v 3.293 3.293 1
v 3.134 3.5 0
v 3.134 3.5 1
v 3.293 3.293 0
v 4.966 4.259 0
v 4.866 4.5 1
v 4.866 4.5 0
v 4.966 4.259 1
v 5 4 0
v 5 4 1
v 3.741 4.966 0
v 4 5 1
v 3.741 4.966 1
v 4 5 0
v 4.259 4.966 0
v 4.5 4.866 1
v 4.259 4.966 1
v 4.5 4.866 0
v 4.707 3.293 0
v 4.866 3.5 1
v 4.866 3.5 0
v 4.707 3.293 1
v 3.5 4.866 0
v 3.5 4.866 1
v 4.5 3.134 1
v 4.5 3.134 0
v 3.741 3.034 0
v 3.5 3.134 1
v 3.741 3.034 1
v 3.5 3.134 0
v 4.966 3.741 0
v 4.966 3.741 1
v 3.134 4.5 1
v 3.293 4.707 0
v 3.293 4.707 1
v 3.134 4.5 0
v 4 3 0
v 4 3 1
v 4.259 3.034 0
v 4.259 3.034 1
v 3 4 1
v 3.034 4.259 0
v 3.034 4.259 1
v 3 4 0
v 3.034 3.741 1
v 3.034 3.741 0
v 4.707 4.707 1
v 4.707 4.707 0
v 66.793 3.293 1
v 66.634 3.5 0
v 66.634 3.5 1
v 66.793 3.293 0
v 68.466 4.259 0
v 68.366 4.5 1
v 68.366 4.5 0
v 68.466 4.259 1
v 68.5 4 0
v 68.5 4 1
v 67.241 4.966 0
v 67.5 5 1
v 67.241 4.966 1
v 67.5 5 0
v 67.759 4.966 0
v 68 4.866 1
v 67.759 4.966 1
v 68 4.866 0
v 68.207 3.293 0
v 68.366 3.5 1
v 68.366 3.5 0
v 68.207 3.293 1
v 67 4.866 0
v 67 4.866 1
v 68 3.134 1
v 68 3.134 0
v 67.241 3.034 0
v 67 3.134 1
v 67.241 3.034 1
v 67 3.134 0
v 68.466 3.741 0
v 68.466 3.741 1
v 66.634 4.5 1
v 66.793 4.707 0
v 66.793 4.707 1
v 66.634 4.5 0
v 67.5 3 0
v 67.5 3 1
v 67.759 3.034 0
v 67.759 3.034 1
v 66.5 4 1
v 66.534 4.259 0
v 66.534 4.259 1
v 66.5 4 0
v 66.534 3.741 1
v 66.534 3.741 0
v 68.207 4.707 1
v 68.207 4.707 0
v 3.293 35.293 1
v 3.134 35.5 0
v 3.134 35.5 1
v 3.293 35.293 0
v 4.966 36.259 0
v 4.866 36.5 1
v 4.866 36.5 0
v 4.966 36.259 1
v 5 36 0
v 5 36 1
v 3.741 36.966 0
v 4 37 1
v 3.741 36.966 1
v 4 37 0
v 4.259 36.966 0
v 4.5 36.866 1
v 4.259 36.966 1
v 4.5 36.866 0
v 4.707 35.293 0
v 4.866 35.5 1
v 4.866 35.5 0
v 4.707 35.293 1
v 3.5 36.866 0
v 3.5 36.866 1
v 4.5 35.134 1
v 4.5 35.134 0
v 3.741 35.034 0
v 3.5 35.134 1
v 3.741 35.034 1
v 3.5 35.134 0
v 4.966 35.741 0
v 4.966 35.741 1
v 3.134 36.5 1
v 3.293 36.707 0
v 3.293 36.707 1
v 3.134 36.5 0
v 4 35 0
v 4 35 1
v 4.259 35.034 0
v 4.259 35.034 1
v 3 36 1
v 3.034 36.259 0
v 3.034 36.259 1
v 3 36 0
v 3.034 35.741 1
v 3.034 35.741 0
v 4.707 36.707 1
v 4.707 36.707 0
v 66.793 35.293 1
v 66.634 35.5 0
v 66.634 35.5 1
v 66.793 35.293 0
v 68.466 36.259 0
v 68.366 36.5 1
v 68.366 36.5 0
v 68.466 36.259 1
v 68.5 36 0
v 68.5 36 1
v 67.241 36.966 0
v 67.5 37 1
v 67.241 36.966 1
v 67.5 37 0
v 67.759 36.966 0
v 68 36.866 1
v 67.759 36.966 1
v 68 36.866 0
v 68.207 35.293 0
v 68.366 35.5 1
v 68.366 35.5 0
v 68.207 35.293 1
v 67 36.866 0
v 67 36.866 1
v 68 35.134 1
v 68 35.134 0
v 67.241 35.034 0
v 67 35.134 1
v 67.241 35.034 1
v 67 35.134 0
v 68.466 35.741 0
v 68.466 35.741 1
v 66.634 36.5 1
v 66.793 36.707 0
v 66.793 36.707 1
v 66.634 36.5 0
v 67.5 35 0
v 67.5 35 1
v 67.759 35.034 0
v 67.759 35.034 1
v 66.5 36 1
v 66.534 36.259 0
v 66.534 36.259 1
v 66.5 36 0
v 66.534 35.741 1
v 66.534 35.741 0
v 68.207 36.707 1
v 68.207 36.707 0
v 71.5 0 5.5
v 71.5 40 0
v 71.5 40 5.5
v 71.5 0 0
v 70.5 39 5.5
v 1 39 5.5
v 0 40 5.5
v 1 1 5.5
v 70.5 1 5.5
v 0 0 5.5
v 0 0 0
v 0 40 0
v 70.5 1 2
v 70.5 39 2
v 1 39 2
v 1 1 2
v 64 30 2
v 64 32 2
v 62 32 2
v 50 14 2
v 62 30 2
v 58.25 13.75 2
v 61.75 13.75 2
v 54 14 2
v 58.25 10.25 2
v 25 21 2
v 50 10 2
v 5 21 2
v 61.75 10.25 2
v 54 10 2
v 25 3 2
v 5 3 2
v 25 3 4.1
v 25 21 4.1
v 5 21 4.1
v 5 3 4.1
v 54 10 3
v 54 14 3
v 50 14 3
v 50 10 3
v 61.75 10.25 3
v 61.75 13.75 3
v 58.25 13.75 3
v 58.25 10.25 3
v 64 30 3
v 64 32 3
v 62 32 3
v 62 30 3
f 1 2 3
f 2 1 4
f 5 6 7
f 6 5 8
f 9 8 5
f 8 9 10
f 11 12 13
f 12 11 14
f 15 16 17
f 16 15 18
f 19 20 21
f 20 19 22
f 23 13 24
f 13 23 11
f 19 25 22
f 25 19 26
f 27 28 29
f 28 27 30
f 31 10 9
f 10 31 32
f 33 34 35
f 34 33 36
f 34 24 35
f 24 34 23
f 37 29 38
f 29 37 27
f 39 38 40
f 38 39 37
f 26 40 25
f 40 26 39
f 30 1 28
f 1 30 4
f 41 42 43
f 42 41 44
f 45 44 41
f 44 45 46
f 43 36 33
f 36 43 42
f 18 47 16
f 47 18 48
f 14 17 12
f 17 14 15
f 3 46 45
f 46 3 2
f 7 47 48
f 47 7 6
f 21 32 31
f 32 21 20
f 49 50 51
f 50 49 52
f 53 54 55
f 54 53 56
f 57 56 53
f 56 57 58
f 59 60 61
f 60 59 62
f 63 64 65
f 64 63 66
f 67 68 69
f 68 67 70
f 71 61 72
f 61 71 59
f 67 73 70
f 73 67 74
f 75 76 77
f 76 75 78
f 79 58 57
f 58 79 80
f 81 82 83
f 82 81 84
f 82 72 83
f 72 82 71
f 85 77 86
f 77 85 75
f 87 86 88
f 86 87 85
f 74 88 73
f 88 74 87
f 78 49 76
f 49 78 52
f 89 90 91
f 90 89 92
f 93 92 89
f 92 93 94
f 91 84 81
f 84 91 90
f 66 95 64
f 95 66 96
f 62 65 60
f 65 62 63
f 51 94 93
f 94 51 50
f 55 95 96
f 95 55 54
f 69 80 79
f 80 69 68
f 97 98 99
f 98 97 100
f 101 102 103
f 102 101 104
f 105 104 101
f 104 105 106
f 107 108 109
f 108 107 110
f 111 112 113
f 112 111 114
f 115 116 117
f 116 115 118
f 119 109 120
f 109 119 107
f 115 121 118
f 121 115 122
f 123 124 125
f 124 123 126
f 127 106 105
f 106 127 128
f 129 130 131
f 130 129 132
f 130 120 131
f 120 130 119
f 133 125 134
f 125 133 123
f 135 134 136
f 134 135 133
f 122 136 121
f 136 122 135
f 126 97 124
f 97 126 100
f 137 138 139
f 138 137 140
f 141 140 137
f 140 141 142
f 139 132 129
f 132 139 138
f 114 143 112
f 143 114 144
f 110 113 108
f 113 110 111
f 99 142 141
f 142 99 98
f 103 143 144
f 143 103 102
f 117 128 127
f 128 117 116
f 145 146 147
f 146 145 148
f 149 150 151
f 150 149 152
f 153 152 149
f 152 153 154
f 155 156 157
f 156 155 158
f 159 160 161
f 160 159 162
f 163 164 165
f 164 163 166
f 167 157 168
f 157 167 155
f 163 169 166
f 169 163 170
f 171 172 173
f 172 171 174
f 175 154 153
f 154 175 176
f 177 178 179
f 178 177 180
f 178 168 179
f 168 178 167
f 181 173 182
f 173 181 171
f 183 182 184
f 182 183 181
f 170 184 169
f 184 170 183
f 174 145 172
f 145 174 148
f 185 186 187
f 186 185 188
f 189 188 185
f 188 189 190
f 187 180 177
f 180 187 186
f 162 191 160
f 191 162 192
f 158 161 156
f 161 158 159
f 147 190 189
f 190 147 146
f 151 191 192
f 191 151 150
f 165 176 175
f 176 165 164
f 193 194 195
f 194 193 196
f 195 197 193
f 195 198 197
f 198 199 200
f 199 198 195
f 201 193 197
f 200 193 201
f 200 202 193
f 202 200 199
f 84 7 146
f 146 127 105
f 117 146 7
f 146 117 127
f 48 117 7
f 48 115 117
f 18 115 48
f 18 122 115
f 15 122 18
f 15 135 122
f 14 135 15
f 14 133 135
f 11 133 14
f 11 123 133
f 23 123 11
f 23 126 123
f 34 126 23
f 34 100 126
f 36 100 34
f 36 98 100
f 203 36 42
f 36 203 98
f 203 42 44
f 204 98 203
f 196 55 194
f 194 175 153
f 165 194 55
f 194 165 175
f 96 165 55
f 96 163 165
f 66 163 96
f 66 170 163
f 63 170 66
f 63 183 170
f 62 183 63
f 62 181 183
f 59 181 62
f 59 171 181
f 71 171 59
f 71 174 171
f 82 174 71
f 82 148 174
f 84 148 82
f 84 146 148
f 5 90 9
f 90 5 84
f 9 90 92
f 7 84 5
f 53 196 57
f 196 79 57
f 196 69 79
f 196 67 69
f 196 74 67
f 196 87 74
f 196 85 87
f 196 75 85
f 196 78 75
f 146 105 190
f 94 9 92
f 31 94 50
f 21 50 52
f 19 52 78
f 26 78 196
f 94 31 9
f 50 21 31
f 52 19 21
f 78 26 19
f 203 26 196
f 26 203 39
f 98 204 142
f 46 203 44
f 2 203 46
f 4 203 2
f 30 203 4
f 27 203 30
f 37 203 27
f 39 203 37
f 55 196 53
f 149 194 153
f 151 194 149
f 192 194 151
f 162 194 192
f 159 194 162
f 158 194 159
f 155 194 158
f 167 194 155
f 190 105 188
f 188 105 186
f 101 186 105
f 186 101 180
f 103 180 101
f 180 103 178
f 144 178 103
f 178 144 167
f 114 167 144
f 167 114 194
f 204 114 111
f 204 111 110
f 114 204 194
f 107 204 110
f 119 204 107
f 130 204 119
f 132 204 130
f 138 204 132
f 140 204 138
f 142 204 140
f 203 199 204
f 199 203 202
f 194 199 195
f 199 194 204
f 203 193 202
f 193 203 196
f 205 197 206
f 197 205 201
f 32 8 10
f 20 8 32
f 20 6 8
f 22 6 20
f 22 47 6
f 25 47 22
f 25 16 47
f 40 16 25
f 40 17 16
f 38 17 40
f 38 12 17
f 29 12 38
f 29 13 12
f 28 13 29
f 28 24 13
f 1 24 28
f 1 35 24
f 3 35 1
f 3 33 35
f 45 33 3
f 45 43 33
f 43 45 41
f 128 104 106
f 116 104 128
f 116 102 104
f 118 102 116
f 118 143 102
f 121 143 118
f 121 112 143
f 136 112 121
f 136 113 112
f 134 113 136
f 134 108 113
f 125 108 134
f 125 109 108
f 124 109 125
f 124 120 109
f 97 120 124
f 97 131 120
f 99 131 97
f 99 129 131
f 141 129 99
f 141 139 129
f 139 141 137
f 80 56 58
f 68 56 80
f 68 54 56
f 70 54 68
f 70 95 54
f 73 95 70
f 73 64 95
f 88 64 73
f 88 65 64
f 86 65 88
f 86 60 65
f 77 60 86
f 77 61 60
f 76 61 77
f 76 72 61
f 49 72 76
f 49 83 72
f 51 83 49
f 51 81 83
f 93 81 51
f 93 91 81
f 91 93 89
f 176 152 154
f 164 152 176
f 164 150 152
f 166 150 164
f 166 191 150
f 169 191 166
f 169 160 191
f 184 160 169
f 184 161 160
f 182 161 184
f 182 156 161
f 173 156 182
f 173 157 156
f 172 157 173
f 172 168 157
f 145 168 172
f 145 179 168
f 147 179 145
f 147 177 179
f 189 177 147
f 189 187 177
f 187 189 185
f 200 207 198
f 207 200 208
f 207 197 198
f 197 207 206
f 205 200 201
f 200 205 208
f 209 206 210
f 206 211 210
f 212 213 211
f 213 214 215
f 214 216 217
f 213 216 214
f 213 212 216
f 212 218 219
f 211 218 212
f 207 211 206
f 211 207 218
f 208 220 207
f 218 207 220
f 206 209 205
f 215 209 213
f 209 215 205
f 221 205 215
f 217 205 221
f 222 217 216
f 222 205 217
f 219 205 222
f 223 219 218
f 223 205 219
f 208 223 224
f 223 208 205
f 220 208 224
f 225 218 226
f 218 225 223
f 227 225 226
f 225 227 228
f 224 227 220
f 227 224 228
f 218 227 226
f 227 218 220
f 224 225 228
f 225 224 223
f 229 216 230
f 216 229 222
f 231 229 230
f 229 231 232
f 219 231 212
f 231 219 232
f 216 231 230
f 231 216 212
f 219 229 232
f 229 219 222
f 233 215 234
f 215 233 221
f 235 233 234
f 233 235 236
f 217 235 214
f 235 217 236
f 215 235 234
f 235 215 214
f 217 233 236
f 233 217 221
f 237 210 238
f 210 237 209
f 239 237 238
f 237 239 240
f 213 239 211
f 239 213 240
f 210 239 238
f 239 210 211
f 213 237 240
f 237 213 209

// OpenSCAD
// Actual BF candidate; uncalibrated packaging hypothesis. Units mm.
// XY is bounded by the original source-module footprint. Default Z is assumed.
length=71.5; width=40.0; wall=1; pcb=1; cavity=4.5;
window=[50,30]; mount_d=2; cap=[20,18,2.1];
cap_centres=[[15, 12]];
mounts=[[4, 4], [67.5, 4], [4, 36.0], [67.5, 36.0]];
module lower_tray() {
 difference() {
  cube([length,width,cavity+wall]);
  translate([wall,wall,wall]) cube([length-2*wall,width-2*wall,cavity+1]);
  for(p=mounts) translate([p[0],p[1],-1]) cylinder(h=wall+2,d=mount_d,$fn=24);
 }
}
module body(x,y,dx,dy,dz) {translate([x-dx/2,y-dy/2,wall+pcb]) cube([dx,dy,dz]);}
lower_tray();
color("darkgreen") translate([wall,wall,wall]) cube([length-2*wall,width-2*wall,pcb]);
for(p=cap_centres) color("silver") body(p[0],p[1],cap[0],cap[1],cap[2]);
color("black") body(52,12,4,4,1); // MSP430 VQFN nominal XY; Z assumed
color("black") body(60,12,3.5,3.5,1); // BQ25570 nominal XY; Z assumed
color("red") body(63,31,2,2,1); // TMP117 WSON nominal XY; Z assumed
// The window is an alignment plane, not an asserted installed irradiance gain.
%translate([(length-window[0])/2,(width-window[1])/2,cavity+wall]) cube([window[0],window[1],0.2]);
